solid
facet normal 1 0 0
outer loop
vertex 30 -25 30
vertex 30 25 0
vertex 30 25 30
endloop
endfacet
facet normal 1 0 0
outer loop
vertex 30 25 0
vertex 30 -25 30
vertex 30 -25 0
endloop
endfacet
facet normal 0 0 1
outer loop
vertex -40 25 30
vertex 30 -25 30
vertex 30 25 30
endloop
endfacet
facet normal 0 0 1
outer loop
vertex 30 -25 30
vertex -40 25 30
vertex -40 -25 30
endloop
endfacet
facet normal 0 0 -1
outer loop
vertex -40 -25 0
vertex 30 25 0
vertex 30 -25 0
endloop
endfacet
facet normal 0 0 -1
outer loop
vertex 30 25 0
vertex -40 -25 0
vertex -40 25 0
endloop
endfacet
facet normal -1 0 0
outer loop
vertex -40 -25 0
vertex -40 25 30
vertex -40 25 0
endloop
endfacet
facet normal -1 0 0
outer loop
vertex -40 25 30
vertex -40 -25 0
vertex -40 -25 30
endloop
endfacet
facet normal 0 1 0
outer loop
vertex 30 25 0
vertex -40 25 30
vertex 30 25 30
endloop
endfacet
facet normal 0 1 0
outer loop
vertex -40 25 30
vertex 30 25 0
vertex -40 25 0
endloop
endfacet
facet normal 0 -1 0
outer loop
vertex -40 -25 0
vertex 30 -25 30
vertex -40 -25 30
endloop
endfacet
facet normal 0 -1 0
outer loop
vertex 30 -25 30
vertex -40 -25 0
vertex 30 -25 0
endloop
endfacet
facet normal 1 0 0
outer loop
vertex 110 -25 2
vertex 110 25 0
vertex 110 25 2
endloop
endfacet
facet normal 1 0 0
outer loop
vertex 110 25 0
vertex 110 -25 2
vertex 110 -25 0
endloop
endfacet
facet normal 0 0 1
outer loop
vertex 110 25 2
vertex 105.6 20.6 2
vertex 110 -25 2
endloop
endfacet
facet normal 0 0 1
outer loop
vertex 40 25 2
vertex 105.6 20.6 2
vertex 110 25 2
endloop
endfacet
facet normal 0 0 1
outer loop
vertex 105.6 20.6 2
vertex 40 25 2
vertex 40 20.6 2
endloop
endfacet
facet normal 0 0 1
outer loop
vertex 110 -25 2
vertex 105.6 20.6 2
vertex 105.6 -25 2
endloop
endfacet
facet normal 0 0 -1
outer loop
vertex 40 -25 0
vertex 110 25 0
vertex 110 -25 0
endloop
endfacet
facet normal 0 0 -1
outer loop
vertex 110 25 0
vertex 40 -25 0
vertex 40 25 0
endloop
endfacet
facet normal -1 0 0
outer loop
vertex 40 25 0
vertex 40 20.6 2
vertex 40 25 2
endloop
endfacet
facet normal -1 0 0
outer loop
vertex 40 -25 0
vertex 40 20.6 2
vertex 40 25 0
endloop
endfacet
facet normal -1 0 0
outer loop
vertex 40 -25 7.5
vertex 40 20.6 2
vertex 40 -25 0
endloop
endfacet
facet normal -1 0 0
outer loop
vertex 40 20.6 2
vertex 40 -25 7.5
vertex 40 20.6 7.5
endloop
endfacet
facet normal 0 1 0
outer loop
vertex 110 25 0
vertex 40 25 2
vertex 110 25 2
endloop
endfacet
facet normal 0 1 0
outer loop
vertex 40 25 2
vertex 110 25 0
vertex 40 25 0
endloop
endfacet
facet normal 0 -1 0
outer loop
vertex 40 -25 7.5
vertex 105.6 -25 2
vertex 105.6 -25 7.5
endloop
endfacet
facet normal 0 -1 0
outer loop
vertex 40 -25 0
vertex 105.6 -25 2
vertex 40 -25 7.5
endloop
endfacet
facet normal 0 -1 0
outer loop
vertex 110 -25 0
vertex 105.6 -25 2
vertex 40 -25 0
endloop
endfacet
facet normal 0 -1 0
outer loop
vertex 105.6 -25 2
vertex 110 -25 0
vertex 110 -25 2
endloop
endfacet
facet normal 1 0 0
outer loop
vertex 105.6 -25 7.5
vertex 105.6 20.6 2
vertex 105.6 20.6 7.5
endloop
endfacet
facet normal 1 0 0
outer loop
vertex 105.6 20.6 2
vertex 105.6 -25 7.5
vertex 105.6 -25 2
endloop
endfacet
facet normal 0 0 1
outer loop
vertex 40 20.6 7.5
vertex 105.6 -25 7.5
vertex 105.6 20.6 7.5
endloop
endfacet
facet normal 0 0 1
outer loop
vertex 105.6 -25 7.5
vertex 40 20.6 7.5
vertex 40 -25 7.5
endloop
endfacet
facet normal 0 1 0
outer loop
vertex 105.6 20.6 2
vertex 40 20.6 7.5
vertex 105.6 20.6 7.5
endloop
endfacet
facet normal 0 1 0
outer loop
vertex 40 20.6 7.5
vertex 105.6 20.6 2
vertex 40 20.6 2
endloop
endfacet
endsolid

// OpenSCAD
// Two-part enclosure for electronics board.
// Part 1: Box (left) - 70x50x30mm outer, 2mm walls, 2mm floor, open top.
// Part 2: Lid (right) - Printed upside down, plate with lip sliding into box.
// Parts are placed side-by-side with a 10mm gap.

// Dimensions
box_X  = 70;
box_Y  = 50;
box_Z  = 30;
wall   = 2;
floor  = 2;

// Lid dimensions
lid_plate_X = 70;
lid_plate_Y = 50;
lid_plate_Z = 2;
lip_wall    = 1.5;
lip_height  = 4;
lip_outer_X = 65.6;
lip_outer_Y = 45.6;

// Gap between parts
gap = 10;

// Derived dimensions for the box inner cavity
box_inner_X = box_X - 2 * wall;
box_inner_Y = box_Y - 2 * wall;
box_inner_Z = box_Z - floor;

// Derived dimensions for the lid lip clearance
// Lip outer size is 65.6 x 45.6. Box inner is 66 x 46.
// Clearance = (Box Inner - Lip Outer) / 2 = (66 - 65.6)/2 = 0.2 mm.

$fn = 64;

// --- Part 1: The Box ---
// Position: Centered in Y, starts at X = -gap/2 - box_X/2.
// We center the whole assembly at X=0.
// Box center X = - (gap + box_X + lid_plate_X) / 2 + box_X/2
// Simpler: Box starts at X = - (gap + box_X) / 2.
// Lid starts at X = - (gap + box_X) / 2 + box_X + gap.

box_start_X = - (gap + box_X) / 2;
lid_start_X = box_start_X + box_X + gap;

// Box Module
module box() {
    // Main block with hole for top
    // We build a solid block and subtract the top opening.
    // Block size: box_X x box_Y x box_Z
    // Opening: (box_X - 2*wall) x (box_Y - 2*wall) x (box_Z - floor)
    
    translate([box_start_X, -box_Y/2, 0]) {
        // Base block
        cube([box_X, box_Y, box_Z]);
        
        // Cut out the top opening
        // The opening is a hole from floor+1 to top.
        // Hole size: inner_X x inner_Y x (box_Z - floor)
        // Position: centered in X and Y.
        // Z start: floor. Z end: box_Z.
        translate([0, 0, floor]) {
            cube([box_inner_X, box_inner_Y, box_Z - floor]);
        }
    }
}

// Lid Module
// The lid is printed upside down relative to the box opening?
// "Part 2, the lid, printed upside down: a plate ... lying on the bed"
// This implies the plate face is on the bed (Z=0). The lip is on top of the plate (positive Z).
// The lip slides into the box.
// So the lip's bottom face is at Z = lid_plate_Z.
// The lip's top face is at Z = lid_plate_Z + lip_height + lip_wall.
// The box opening is at Z = floor to box_Z.
// We need the lip to fit inside.
// Lip bottom Z = 2. Lip top Z = 2 + 4 + 1.5 = 7.5.
// Box opening Z range = 2 to 30.
// So the lip fits vertically.

module lid() {
    translate([lid_start_X, -lid_plate_Y/2, 0]) {
        // 1. The base plate
        cube([lid_plate_X, lid_plate_Y, lid_plate_Z]);
        
        // 2. The lip
        // The lip is a rectangular block sitting on the plate.
        // Outer dimensions: lip_outer_X x lip_outer_Y
        // Height: lip_height + lip_wall
        // It is centered on the plate.
        // We model it as a solid block.
        // Thickness in Z: lip_height + lip_wall = 5.5
        // Position Z: starts at lid_plate_Z (2)
        
        translate([0, 0, lid_plate_Z]) {
            cube([lip_outer_X, lip_outer_Y, lip_height + lip_wall]);
        }
    }
}

// --- Assembly ---
// We use a union to print them together.
// Since they are separate modules, we just call them.
// However, to ensure they don't merge into a single mesh that might cause issues with supports or slicing if they touch,
// we rely on the gap. The gap is 10mm, so they are far apart.

difference() {
    // We don't need a difference here unless we want to hide supports.
    // Just union the parts.
    union() {
        box();
        lid();
    }
}
